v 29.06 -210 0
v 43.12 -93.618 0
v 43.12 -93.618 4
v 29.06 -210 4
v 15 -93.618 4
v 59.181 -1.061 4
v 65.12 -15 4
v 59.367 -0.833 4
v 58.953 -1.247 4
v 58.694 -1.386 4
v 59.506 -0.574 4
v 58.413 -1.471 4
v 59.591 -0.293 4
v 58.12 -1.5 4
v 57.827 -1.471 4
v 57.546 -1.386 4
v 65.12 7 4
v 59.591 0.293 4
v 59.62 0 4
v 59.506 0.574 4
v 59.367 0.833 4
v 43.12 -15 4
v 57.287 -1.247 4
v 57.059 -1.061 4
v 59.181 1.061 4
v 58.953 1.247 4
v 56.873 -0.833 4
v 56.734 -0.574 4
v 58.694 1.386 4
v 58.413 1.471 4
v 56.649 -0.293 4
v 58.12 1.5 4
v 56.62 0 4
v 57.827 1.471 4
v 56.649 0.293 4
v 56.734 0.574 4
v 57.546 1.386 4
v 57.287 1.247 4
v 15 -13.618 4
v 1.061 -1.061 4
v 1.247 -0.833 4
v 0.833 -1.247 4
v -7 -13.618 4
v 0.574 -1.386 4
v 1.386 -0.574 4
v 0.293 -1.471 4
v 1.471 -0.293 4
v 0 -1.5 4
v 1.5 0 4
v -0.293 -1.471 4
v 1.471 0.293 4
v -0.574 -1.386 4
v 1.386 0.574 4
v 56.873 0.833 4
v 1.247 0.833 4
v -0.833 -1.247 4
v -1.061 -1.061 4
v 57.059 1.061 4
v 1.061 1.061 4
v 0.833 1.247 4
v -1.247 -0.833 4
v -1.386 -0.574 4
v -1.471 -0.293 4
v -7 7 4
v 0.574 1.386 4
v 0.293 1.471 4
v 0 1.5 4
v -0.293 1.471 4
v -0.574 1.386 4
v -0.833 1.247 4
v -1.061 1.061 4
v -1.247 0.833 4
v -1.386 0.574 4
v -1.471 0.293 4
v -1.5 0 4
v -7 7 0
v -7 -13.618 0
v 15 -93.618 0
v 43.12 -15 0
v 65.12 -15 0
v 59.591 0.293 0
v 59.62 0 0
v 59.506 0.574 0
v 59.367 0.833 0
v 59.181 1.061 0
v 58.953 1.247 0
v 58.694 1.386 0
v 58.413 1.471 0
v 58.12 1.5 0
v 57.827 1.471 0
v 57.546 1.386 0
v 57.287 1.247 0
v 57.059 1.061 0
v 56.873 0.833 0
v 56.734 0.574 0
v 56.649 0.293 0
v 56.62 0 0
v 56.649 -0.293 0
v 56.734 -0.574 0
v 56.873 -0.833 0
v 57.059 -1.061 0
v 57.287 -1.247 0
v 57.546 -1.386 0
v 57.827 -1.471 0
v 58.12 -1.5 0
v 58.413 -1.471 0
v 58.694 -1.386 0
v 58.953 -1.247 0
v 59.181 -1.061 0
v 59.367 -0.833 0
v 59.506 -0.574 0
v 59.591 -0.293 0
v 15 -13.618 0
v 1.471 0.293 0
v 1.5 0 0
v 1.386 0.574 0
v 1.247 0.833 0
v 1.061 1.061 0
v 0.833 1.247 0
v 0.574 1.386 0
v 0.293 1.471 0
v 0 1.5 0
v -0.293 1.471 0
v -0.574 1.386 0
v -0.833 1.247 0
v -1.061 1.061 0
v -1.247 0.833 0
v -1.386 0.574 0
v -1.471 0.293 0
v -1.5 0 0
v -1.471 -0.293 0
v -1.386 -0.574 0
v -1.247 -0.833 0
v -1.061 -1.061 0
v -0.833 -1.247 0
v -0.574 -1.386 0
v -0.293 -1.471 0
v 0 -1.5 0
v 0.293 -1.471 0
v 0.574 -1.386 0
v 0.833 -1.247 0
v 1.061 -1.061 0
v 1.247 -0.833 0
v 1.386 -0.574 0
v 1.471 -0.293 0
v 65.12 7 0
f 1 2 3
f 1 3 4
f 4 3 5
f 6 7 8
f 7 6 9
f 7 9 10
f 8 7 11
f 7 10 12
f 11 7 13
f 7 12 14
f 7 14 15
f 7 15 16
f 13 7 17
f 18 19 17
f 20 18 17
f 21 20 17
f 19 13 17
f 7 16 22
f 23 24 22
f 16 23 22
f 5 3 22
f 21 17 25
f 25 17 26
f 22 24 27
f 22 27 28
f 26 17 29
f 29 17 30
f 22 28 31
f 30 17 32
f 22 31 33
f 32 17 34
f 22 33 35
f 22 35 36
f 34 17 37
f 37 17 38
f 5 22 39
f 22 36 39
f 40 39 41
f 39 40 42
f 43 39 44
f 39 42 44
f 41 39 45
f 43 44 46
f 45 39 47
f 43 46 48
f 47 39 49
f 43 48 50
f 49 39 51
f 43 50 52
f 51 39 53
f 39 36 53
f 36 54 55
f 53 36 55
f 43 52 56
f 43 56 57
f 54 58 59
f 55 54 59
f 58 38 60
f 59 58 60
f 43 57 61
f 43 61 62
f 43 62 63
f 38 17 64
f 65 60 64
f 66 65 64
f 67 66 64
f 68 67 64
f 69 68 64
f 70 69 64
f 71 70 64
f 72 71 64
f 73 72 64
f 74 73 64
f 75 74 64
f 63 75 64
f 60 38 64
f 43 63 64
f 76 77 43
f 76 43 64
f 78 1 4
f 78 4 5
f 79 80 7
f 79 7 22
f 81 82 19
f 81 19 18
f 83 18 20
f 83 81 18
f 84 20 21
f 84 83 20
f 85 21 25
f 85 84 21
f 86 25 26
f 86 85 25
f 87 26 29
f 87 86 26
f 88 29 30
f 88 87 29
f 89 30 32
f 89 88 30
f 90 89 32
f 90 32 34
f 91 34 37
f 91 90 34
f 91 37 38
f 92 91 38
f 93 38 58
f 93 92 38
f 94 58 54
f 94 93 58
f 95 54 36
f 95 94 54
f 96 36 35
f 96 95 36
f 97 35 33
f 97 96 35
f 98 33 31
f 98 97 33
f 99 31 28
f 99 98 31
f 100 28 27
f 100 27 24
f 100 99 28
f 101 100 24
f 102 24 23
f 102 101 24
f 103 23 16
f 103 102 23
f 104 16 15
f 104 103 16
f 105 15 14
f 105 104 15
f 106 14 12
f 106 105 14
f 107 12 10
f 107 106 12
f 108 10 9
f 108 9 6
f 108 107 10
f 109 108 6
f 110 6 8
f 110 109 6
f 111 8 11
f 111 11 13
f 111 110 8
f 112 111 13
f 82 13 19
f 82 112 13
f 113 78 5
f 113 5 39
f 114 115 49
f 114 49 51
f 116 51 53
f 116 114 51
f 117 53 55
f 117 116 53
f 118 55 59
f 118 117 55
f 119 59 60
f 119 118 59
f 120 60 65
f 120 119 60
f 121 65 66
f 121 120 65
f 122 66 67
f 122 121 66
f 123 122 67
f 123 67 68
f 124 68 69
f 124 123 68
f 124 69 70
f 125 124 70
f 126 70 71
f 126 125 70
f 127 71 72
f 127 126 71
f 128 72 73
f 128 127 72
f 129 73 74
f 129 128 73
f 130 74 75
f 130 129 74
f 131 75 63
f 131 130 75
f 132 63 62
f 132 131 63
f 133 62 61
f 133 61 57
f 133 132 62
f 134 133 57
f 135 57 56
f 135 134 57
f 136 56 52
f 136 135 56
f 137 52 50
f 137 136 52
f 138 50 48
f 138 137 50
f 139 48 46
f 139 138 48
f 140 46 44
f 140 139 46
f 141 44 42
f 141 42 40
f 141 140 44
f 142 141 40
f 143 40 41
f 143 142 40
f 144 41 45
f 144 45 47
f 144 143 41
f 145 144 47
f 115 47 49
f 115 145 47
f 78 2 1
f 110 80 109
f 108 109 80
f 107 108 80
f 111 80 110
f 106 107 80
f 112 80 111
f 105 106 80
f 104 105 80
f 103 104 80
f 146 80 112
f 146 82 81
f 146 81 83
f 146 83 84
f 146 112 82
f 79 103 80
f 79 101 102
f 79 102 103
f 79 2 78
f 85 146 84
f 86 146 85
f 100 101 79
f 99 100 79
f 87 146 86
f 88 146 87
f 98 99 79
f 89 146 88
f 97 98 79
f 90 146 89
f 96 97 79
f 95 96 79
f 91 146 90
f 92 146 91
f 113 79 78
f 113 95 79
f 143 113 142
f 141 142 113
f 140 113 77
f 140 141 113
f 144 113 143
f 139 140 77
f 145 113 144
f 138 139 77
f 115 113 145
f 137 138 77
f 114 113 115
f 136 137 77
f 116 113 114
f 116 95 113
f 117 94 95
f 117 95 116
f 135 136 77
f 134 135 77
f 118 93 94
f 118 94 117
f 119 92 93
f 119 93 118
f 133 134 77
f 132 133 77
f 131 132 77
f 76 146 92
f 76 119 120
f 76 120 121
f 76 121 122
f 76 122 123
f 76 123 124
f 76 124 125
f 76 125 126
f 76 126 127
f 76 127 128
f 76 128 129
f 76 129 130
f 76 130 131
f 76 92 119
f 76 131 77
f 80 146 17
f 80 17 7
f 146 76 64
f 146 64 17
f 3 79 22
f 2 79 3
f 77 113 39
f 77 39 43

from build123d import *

# Parameters (mm, degrees)
SKETCH_1_R      = 1.5
EXTRUDE_1_DEPTH = 4


with BuildPart() as part:
    # 草图1 → 凸台-拉伸1 (new body)
    with BuildSketch(Plane.XY):
        Polygon((-7, 7), (65.12, 7), (65.12, -15), (43.12, -15), (43.12, -93.617838822), (29.06, -210), (15, -93.617838822), (15, -13.617838822), (-7, -13.617838822), align=None)
        Circle(SKETCH_1_R, mode=Mode.SUBTRACT)
        with Locations((58.12, 0)):
            Circle(SKETCH_1_R, mode=Mode.SUBTRACT)
    extrude(amount=EXTRUDE_1_DEPTH)


solid = part.part
